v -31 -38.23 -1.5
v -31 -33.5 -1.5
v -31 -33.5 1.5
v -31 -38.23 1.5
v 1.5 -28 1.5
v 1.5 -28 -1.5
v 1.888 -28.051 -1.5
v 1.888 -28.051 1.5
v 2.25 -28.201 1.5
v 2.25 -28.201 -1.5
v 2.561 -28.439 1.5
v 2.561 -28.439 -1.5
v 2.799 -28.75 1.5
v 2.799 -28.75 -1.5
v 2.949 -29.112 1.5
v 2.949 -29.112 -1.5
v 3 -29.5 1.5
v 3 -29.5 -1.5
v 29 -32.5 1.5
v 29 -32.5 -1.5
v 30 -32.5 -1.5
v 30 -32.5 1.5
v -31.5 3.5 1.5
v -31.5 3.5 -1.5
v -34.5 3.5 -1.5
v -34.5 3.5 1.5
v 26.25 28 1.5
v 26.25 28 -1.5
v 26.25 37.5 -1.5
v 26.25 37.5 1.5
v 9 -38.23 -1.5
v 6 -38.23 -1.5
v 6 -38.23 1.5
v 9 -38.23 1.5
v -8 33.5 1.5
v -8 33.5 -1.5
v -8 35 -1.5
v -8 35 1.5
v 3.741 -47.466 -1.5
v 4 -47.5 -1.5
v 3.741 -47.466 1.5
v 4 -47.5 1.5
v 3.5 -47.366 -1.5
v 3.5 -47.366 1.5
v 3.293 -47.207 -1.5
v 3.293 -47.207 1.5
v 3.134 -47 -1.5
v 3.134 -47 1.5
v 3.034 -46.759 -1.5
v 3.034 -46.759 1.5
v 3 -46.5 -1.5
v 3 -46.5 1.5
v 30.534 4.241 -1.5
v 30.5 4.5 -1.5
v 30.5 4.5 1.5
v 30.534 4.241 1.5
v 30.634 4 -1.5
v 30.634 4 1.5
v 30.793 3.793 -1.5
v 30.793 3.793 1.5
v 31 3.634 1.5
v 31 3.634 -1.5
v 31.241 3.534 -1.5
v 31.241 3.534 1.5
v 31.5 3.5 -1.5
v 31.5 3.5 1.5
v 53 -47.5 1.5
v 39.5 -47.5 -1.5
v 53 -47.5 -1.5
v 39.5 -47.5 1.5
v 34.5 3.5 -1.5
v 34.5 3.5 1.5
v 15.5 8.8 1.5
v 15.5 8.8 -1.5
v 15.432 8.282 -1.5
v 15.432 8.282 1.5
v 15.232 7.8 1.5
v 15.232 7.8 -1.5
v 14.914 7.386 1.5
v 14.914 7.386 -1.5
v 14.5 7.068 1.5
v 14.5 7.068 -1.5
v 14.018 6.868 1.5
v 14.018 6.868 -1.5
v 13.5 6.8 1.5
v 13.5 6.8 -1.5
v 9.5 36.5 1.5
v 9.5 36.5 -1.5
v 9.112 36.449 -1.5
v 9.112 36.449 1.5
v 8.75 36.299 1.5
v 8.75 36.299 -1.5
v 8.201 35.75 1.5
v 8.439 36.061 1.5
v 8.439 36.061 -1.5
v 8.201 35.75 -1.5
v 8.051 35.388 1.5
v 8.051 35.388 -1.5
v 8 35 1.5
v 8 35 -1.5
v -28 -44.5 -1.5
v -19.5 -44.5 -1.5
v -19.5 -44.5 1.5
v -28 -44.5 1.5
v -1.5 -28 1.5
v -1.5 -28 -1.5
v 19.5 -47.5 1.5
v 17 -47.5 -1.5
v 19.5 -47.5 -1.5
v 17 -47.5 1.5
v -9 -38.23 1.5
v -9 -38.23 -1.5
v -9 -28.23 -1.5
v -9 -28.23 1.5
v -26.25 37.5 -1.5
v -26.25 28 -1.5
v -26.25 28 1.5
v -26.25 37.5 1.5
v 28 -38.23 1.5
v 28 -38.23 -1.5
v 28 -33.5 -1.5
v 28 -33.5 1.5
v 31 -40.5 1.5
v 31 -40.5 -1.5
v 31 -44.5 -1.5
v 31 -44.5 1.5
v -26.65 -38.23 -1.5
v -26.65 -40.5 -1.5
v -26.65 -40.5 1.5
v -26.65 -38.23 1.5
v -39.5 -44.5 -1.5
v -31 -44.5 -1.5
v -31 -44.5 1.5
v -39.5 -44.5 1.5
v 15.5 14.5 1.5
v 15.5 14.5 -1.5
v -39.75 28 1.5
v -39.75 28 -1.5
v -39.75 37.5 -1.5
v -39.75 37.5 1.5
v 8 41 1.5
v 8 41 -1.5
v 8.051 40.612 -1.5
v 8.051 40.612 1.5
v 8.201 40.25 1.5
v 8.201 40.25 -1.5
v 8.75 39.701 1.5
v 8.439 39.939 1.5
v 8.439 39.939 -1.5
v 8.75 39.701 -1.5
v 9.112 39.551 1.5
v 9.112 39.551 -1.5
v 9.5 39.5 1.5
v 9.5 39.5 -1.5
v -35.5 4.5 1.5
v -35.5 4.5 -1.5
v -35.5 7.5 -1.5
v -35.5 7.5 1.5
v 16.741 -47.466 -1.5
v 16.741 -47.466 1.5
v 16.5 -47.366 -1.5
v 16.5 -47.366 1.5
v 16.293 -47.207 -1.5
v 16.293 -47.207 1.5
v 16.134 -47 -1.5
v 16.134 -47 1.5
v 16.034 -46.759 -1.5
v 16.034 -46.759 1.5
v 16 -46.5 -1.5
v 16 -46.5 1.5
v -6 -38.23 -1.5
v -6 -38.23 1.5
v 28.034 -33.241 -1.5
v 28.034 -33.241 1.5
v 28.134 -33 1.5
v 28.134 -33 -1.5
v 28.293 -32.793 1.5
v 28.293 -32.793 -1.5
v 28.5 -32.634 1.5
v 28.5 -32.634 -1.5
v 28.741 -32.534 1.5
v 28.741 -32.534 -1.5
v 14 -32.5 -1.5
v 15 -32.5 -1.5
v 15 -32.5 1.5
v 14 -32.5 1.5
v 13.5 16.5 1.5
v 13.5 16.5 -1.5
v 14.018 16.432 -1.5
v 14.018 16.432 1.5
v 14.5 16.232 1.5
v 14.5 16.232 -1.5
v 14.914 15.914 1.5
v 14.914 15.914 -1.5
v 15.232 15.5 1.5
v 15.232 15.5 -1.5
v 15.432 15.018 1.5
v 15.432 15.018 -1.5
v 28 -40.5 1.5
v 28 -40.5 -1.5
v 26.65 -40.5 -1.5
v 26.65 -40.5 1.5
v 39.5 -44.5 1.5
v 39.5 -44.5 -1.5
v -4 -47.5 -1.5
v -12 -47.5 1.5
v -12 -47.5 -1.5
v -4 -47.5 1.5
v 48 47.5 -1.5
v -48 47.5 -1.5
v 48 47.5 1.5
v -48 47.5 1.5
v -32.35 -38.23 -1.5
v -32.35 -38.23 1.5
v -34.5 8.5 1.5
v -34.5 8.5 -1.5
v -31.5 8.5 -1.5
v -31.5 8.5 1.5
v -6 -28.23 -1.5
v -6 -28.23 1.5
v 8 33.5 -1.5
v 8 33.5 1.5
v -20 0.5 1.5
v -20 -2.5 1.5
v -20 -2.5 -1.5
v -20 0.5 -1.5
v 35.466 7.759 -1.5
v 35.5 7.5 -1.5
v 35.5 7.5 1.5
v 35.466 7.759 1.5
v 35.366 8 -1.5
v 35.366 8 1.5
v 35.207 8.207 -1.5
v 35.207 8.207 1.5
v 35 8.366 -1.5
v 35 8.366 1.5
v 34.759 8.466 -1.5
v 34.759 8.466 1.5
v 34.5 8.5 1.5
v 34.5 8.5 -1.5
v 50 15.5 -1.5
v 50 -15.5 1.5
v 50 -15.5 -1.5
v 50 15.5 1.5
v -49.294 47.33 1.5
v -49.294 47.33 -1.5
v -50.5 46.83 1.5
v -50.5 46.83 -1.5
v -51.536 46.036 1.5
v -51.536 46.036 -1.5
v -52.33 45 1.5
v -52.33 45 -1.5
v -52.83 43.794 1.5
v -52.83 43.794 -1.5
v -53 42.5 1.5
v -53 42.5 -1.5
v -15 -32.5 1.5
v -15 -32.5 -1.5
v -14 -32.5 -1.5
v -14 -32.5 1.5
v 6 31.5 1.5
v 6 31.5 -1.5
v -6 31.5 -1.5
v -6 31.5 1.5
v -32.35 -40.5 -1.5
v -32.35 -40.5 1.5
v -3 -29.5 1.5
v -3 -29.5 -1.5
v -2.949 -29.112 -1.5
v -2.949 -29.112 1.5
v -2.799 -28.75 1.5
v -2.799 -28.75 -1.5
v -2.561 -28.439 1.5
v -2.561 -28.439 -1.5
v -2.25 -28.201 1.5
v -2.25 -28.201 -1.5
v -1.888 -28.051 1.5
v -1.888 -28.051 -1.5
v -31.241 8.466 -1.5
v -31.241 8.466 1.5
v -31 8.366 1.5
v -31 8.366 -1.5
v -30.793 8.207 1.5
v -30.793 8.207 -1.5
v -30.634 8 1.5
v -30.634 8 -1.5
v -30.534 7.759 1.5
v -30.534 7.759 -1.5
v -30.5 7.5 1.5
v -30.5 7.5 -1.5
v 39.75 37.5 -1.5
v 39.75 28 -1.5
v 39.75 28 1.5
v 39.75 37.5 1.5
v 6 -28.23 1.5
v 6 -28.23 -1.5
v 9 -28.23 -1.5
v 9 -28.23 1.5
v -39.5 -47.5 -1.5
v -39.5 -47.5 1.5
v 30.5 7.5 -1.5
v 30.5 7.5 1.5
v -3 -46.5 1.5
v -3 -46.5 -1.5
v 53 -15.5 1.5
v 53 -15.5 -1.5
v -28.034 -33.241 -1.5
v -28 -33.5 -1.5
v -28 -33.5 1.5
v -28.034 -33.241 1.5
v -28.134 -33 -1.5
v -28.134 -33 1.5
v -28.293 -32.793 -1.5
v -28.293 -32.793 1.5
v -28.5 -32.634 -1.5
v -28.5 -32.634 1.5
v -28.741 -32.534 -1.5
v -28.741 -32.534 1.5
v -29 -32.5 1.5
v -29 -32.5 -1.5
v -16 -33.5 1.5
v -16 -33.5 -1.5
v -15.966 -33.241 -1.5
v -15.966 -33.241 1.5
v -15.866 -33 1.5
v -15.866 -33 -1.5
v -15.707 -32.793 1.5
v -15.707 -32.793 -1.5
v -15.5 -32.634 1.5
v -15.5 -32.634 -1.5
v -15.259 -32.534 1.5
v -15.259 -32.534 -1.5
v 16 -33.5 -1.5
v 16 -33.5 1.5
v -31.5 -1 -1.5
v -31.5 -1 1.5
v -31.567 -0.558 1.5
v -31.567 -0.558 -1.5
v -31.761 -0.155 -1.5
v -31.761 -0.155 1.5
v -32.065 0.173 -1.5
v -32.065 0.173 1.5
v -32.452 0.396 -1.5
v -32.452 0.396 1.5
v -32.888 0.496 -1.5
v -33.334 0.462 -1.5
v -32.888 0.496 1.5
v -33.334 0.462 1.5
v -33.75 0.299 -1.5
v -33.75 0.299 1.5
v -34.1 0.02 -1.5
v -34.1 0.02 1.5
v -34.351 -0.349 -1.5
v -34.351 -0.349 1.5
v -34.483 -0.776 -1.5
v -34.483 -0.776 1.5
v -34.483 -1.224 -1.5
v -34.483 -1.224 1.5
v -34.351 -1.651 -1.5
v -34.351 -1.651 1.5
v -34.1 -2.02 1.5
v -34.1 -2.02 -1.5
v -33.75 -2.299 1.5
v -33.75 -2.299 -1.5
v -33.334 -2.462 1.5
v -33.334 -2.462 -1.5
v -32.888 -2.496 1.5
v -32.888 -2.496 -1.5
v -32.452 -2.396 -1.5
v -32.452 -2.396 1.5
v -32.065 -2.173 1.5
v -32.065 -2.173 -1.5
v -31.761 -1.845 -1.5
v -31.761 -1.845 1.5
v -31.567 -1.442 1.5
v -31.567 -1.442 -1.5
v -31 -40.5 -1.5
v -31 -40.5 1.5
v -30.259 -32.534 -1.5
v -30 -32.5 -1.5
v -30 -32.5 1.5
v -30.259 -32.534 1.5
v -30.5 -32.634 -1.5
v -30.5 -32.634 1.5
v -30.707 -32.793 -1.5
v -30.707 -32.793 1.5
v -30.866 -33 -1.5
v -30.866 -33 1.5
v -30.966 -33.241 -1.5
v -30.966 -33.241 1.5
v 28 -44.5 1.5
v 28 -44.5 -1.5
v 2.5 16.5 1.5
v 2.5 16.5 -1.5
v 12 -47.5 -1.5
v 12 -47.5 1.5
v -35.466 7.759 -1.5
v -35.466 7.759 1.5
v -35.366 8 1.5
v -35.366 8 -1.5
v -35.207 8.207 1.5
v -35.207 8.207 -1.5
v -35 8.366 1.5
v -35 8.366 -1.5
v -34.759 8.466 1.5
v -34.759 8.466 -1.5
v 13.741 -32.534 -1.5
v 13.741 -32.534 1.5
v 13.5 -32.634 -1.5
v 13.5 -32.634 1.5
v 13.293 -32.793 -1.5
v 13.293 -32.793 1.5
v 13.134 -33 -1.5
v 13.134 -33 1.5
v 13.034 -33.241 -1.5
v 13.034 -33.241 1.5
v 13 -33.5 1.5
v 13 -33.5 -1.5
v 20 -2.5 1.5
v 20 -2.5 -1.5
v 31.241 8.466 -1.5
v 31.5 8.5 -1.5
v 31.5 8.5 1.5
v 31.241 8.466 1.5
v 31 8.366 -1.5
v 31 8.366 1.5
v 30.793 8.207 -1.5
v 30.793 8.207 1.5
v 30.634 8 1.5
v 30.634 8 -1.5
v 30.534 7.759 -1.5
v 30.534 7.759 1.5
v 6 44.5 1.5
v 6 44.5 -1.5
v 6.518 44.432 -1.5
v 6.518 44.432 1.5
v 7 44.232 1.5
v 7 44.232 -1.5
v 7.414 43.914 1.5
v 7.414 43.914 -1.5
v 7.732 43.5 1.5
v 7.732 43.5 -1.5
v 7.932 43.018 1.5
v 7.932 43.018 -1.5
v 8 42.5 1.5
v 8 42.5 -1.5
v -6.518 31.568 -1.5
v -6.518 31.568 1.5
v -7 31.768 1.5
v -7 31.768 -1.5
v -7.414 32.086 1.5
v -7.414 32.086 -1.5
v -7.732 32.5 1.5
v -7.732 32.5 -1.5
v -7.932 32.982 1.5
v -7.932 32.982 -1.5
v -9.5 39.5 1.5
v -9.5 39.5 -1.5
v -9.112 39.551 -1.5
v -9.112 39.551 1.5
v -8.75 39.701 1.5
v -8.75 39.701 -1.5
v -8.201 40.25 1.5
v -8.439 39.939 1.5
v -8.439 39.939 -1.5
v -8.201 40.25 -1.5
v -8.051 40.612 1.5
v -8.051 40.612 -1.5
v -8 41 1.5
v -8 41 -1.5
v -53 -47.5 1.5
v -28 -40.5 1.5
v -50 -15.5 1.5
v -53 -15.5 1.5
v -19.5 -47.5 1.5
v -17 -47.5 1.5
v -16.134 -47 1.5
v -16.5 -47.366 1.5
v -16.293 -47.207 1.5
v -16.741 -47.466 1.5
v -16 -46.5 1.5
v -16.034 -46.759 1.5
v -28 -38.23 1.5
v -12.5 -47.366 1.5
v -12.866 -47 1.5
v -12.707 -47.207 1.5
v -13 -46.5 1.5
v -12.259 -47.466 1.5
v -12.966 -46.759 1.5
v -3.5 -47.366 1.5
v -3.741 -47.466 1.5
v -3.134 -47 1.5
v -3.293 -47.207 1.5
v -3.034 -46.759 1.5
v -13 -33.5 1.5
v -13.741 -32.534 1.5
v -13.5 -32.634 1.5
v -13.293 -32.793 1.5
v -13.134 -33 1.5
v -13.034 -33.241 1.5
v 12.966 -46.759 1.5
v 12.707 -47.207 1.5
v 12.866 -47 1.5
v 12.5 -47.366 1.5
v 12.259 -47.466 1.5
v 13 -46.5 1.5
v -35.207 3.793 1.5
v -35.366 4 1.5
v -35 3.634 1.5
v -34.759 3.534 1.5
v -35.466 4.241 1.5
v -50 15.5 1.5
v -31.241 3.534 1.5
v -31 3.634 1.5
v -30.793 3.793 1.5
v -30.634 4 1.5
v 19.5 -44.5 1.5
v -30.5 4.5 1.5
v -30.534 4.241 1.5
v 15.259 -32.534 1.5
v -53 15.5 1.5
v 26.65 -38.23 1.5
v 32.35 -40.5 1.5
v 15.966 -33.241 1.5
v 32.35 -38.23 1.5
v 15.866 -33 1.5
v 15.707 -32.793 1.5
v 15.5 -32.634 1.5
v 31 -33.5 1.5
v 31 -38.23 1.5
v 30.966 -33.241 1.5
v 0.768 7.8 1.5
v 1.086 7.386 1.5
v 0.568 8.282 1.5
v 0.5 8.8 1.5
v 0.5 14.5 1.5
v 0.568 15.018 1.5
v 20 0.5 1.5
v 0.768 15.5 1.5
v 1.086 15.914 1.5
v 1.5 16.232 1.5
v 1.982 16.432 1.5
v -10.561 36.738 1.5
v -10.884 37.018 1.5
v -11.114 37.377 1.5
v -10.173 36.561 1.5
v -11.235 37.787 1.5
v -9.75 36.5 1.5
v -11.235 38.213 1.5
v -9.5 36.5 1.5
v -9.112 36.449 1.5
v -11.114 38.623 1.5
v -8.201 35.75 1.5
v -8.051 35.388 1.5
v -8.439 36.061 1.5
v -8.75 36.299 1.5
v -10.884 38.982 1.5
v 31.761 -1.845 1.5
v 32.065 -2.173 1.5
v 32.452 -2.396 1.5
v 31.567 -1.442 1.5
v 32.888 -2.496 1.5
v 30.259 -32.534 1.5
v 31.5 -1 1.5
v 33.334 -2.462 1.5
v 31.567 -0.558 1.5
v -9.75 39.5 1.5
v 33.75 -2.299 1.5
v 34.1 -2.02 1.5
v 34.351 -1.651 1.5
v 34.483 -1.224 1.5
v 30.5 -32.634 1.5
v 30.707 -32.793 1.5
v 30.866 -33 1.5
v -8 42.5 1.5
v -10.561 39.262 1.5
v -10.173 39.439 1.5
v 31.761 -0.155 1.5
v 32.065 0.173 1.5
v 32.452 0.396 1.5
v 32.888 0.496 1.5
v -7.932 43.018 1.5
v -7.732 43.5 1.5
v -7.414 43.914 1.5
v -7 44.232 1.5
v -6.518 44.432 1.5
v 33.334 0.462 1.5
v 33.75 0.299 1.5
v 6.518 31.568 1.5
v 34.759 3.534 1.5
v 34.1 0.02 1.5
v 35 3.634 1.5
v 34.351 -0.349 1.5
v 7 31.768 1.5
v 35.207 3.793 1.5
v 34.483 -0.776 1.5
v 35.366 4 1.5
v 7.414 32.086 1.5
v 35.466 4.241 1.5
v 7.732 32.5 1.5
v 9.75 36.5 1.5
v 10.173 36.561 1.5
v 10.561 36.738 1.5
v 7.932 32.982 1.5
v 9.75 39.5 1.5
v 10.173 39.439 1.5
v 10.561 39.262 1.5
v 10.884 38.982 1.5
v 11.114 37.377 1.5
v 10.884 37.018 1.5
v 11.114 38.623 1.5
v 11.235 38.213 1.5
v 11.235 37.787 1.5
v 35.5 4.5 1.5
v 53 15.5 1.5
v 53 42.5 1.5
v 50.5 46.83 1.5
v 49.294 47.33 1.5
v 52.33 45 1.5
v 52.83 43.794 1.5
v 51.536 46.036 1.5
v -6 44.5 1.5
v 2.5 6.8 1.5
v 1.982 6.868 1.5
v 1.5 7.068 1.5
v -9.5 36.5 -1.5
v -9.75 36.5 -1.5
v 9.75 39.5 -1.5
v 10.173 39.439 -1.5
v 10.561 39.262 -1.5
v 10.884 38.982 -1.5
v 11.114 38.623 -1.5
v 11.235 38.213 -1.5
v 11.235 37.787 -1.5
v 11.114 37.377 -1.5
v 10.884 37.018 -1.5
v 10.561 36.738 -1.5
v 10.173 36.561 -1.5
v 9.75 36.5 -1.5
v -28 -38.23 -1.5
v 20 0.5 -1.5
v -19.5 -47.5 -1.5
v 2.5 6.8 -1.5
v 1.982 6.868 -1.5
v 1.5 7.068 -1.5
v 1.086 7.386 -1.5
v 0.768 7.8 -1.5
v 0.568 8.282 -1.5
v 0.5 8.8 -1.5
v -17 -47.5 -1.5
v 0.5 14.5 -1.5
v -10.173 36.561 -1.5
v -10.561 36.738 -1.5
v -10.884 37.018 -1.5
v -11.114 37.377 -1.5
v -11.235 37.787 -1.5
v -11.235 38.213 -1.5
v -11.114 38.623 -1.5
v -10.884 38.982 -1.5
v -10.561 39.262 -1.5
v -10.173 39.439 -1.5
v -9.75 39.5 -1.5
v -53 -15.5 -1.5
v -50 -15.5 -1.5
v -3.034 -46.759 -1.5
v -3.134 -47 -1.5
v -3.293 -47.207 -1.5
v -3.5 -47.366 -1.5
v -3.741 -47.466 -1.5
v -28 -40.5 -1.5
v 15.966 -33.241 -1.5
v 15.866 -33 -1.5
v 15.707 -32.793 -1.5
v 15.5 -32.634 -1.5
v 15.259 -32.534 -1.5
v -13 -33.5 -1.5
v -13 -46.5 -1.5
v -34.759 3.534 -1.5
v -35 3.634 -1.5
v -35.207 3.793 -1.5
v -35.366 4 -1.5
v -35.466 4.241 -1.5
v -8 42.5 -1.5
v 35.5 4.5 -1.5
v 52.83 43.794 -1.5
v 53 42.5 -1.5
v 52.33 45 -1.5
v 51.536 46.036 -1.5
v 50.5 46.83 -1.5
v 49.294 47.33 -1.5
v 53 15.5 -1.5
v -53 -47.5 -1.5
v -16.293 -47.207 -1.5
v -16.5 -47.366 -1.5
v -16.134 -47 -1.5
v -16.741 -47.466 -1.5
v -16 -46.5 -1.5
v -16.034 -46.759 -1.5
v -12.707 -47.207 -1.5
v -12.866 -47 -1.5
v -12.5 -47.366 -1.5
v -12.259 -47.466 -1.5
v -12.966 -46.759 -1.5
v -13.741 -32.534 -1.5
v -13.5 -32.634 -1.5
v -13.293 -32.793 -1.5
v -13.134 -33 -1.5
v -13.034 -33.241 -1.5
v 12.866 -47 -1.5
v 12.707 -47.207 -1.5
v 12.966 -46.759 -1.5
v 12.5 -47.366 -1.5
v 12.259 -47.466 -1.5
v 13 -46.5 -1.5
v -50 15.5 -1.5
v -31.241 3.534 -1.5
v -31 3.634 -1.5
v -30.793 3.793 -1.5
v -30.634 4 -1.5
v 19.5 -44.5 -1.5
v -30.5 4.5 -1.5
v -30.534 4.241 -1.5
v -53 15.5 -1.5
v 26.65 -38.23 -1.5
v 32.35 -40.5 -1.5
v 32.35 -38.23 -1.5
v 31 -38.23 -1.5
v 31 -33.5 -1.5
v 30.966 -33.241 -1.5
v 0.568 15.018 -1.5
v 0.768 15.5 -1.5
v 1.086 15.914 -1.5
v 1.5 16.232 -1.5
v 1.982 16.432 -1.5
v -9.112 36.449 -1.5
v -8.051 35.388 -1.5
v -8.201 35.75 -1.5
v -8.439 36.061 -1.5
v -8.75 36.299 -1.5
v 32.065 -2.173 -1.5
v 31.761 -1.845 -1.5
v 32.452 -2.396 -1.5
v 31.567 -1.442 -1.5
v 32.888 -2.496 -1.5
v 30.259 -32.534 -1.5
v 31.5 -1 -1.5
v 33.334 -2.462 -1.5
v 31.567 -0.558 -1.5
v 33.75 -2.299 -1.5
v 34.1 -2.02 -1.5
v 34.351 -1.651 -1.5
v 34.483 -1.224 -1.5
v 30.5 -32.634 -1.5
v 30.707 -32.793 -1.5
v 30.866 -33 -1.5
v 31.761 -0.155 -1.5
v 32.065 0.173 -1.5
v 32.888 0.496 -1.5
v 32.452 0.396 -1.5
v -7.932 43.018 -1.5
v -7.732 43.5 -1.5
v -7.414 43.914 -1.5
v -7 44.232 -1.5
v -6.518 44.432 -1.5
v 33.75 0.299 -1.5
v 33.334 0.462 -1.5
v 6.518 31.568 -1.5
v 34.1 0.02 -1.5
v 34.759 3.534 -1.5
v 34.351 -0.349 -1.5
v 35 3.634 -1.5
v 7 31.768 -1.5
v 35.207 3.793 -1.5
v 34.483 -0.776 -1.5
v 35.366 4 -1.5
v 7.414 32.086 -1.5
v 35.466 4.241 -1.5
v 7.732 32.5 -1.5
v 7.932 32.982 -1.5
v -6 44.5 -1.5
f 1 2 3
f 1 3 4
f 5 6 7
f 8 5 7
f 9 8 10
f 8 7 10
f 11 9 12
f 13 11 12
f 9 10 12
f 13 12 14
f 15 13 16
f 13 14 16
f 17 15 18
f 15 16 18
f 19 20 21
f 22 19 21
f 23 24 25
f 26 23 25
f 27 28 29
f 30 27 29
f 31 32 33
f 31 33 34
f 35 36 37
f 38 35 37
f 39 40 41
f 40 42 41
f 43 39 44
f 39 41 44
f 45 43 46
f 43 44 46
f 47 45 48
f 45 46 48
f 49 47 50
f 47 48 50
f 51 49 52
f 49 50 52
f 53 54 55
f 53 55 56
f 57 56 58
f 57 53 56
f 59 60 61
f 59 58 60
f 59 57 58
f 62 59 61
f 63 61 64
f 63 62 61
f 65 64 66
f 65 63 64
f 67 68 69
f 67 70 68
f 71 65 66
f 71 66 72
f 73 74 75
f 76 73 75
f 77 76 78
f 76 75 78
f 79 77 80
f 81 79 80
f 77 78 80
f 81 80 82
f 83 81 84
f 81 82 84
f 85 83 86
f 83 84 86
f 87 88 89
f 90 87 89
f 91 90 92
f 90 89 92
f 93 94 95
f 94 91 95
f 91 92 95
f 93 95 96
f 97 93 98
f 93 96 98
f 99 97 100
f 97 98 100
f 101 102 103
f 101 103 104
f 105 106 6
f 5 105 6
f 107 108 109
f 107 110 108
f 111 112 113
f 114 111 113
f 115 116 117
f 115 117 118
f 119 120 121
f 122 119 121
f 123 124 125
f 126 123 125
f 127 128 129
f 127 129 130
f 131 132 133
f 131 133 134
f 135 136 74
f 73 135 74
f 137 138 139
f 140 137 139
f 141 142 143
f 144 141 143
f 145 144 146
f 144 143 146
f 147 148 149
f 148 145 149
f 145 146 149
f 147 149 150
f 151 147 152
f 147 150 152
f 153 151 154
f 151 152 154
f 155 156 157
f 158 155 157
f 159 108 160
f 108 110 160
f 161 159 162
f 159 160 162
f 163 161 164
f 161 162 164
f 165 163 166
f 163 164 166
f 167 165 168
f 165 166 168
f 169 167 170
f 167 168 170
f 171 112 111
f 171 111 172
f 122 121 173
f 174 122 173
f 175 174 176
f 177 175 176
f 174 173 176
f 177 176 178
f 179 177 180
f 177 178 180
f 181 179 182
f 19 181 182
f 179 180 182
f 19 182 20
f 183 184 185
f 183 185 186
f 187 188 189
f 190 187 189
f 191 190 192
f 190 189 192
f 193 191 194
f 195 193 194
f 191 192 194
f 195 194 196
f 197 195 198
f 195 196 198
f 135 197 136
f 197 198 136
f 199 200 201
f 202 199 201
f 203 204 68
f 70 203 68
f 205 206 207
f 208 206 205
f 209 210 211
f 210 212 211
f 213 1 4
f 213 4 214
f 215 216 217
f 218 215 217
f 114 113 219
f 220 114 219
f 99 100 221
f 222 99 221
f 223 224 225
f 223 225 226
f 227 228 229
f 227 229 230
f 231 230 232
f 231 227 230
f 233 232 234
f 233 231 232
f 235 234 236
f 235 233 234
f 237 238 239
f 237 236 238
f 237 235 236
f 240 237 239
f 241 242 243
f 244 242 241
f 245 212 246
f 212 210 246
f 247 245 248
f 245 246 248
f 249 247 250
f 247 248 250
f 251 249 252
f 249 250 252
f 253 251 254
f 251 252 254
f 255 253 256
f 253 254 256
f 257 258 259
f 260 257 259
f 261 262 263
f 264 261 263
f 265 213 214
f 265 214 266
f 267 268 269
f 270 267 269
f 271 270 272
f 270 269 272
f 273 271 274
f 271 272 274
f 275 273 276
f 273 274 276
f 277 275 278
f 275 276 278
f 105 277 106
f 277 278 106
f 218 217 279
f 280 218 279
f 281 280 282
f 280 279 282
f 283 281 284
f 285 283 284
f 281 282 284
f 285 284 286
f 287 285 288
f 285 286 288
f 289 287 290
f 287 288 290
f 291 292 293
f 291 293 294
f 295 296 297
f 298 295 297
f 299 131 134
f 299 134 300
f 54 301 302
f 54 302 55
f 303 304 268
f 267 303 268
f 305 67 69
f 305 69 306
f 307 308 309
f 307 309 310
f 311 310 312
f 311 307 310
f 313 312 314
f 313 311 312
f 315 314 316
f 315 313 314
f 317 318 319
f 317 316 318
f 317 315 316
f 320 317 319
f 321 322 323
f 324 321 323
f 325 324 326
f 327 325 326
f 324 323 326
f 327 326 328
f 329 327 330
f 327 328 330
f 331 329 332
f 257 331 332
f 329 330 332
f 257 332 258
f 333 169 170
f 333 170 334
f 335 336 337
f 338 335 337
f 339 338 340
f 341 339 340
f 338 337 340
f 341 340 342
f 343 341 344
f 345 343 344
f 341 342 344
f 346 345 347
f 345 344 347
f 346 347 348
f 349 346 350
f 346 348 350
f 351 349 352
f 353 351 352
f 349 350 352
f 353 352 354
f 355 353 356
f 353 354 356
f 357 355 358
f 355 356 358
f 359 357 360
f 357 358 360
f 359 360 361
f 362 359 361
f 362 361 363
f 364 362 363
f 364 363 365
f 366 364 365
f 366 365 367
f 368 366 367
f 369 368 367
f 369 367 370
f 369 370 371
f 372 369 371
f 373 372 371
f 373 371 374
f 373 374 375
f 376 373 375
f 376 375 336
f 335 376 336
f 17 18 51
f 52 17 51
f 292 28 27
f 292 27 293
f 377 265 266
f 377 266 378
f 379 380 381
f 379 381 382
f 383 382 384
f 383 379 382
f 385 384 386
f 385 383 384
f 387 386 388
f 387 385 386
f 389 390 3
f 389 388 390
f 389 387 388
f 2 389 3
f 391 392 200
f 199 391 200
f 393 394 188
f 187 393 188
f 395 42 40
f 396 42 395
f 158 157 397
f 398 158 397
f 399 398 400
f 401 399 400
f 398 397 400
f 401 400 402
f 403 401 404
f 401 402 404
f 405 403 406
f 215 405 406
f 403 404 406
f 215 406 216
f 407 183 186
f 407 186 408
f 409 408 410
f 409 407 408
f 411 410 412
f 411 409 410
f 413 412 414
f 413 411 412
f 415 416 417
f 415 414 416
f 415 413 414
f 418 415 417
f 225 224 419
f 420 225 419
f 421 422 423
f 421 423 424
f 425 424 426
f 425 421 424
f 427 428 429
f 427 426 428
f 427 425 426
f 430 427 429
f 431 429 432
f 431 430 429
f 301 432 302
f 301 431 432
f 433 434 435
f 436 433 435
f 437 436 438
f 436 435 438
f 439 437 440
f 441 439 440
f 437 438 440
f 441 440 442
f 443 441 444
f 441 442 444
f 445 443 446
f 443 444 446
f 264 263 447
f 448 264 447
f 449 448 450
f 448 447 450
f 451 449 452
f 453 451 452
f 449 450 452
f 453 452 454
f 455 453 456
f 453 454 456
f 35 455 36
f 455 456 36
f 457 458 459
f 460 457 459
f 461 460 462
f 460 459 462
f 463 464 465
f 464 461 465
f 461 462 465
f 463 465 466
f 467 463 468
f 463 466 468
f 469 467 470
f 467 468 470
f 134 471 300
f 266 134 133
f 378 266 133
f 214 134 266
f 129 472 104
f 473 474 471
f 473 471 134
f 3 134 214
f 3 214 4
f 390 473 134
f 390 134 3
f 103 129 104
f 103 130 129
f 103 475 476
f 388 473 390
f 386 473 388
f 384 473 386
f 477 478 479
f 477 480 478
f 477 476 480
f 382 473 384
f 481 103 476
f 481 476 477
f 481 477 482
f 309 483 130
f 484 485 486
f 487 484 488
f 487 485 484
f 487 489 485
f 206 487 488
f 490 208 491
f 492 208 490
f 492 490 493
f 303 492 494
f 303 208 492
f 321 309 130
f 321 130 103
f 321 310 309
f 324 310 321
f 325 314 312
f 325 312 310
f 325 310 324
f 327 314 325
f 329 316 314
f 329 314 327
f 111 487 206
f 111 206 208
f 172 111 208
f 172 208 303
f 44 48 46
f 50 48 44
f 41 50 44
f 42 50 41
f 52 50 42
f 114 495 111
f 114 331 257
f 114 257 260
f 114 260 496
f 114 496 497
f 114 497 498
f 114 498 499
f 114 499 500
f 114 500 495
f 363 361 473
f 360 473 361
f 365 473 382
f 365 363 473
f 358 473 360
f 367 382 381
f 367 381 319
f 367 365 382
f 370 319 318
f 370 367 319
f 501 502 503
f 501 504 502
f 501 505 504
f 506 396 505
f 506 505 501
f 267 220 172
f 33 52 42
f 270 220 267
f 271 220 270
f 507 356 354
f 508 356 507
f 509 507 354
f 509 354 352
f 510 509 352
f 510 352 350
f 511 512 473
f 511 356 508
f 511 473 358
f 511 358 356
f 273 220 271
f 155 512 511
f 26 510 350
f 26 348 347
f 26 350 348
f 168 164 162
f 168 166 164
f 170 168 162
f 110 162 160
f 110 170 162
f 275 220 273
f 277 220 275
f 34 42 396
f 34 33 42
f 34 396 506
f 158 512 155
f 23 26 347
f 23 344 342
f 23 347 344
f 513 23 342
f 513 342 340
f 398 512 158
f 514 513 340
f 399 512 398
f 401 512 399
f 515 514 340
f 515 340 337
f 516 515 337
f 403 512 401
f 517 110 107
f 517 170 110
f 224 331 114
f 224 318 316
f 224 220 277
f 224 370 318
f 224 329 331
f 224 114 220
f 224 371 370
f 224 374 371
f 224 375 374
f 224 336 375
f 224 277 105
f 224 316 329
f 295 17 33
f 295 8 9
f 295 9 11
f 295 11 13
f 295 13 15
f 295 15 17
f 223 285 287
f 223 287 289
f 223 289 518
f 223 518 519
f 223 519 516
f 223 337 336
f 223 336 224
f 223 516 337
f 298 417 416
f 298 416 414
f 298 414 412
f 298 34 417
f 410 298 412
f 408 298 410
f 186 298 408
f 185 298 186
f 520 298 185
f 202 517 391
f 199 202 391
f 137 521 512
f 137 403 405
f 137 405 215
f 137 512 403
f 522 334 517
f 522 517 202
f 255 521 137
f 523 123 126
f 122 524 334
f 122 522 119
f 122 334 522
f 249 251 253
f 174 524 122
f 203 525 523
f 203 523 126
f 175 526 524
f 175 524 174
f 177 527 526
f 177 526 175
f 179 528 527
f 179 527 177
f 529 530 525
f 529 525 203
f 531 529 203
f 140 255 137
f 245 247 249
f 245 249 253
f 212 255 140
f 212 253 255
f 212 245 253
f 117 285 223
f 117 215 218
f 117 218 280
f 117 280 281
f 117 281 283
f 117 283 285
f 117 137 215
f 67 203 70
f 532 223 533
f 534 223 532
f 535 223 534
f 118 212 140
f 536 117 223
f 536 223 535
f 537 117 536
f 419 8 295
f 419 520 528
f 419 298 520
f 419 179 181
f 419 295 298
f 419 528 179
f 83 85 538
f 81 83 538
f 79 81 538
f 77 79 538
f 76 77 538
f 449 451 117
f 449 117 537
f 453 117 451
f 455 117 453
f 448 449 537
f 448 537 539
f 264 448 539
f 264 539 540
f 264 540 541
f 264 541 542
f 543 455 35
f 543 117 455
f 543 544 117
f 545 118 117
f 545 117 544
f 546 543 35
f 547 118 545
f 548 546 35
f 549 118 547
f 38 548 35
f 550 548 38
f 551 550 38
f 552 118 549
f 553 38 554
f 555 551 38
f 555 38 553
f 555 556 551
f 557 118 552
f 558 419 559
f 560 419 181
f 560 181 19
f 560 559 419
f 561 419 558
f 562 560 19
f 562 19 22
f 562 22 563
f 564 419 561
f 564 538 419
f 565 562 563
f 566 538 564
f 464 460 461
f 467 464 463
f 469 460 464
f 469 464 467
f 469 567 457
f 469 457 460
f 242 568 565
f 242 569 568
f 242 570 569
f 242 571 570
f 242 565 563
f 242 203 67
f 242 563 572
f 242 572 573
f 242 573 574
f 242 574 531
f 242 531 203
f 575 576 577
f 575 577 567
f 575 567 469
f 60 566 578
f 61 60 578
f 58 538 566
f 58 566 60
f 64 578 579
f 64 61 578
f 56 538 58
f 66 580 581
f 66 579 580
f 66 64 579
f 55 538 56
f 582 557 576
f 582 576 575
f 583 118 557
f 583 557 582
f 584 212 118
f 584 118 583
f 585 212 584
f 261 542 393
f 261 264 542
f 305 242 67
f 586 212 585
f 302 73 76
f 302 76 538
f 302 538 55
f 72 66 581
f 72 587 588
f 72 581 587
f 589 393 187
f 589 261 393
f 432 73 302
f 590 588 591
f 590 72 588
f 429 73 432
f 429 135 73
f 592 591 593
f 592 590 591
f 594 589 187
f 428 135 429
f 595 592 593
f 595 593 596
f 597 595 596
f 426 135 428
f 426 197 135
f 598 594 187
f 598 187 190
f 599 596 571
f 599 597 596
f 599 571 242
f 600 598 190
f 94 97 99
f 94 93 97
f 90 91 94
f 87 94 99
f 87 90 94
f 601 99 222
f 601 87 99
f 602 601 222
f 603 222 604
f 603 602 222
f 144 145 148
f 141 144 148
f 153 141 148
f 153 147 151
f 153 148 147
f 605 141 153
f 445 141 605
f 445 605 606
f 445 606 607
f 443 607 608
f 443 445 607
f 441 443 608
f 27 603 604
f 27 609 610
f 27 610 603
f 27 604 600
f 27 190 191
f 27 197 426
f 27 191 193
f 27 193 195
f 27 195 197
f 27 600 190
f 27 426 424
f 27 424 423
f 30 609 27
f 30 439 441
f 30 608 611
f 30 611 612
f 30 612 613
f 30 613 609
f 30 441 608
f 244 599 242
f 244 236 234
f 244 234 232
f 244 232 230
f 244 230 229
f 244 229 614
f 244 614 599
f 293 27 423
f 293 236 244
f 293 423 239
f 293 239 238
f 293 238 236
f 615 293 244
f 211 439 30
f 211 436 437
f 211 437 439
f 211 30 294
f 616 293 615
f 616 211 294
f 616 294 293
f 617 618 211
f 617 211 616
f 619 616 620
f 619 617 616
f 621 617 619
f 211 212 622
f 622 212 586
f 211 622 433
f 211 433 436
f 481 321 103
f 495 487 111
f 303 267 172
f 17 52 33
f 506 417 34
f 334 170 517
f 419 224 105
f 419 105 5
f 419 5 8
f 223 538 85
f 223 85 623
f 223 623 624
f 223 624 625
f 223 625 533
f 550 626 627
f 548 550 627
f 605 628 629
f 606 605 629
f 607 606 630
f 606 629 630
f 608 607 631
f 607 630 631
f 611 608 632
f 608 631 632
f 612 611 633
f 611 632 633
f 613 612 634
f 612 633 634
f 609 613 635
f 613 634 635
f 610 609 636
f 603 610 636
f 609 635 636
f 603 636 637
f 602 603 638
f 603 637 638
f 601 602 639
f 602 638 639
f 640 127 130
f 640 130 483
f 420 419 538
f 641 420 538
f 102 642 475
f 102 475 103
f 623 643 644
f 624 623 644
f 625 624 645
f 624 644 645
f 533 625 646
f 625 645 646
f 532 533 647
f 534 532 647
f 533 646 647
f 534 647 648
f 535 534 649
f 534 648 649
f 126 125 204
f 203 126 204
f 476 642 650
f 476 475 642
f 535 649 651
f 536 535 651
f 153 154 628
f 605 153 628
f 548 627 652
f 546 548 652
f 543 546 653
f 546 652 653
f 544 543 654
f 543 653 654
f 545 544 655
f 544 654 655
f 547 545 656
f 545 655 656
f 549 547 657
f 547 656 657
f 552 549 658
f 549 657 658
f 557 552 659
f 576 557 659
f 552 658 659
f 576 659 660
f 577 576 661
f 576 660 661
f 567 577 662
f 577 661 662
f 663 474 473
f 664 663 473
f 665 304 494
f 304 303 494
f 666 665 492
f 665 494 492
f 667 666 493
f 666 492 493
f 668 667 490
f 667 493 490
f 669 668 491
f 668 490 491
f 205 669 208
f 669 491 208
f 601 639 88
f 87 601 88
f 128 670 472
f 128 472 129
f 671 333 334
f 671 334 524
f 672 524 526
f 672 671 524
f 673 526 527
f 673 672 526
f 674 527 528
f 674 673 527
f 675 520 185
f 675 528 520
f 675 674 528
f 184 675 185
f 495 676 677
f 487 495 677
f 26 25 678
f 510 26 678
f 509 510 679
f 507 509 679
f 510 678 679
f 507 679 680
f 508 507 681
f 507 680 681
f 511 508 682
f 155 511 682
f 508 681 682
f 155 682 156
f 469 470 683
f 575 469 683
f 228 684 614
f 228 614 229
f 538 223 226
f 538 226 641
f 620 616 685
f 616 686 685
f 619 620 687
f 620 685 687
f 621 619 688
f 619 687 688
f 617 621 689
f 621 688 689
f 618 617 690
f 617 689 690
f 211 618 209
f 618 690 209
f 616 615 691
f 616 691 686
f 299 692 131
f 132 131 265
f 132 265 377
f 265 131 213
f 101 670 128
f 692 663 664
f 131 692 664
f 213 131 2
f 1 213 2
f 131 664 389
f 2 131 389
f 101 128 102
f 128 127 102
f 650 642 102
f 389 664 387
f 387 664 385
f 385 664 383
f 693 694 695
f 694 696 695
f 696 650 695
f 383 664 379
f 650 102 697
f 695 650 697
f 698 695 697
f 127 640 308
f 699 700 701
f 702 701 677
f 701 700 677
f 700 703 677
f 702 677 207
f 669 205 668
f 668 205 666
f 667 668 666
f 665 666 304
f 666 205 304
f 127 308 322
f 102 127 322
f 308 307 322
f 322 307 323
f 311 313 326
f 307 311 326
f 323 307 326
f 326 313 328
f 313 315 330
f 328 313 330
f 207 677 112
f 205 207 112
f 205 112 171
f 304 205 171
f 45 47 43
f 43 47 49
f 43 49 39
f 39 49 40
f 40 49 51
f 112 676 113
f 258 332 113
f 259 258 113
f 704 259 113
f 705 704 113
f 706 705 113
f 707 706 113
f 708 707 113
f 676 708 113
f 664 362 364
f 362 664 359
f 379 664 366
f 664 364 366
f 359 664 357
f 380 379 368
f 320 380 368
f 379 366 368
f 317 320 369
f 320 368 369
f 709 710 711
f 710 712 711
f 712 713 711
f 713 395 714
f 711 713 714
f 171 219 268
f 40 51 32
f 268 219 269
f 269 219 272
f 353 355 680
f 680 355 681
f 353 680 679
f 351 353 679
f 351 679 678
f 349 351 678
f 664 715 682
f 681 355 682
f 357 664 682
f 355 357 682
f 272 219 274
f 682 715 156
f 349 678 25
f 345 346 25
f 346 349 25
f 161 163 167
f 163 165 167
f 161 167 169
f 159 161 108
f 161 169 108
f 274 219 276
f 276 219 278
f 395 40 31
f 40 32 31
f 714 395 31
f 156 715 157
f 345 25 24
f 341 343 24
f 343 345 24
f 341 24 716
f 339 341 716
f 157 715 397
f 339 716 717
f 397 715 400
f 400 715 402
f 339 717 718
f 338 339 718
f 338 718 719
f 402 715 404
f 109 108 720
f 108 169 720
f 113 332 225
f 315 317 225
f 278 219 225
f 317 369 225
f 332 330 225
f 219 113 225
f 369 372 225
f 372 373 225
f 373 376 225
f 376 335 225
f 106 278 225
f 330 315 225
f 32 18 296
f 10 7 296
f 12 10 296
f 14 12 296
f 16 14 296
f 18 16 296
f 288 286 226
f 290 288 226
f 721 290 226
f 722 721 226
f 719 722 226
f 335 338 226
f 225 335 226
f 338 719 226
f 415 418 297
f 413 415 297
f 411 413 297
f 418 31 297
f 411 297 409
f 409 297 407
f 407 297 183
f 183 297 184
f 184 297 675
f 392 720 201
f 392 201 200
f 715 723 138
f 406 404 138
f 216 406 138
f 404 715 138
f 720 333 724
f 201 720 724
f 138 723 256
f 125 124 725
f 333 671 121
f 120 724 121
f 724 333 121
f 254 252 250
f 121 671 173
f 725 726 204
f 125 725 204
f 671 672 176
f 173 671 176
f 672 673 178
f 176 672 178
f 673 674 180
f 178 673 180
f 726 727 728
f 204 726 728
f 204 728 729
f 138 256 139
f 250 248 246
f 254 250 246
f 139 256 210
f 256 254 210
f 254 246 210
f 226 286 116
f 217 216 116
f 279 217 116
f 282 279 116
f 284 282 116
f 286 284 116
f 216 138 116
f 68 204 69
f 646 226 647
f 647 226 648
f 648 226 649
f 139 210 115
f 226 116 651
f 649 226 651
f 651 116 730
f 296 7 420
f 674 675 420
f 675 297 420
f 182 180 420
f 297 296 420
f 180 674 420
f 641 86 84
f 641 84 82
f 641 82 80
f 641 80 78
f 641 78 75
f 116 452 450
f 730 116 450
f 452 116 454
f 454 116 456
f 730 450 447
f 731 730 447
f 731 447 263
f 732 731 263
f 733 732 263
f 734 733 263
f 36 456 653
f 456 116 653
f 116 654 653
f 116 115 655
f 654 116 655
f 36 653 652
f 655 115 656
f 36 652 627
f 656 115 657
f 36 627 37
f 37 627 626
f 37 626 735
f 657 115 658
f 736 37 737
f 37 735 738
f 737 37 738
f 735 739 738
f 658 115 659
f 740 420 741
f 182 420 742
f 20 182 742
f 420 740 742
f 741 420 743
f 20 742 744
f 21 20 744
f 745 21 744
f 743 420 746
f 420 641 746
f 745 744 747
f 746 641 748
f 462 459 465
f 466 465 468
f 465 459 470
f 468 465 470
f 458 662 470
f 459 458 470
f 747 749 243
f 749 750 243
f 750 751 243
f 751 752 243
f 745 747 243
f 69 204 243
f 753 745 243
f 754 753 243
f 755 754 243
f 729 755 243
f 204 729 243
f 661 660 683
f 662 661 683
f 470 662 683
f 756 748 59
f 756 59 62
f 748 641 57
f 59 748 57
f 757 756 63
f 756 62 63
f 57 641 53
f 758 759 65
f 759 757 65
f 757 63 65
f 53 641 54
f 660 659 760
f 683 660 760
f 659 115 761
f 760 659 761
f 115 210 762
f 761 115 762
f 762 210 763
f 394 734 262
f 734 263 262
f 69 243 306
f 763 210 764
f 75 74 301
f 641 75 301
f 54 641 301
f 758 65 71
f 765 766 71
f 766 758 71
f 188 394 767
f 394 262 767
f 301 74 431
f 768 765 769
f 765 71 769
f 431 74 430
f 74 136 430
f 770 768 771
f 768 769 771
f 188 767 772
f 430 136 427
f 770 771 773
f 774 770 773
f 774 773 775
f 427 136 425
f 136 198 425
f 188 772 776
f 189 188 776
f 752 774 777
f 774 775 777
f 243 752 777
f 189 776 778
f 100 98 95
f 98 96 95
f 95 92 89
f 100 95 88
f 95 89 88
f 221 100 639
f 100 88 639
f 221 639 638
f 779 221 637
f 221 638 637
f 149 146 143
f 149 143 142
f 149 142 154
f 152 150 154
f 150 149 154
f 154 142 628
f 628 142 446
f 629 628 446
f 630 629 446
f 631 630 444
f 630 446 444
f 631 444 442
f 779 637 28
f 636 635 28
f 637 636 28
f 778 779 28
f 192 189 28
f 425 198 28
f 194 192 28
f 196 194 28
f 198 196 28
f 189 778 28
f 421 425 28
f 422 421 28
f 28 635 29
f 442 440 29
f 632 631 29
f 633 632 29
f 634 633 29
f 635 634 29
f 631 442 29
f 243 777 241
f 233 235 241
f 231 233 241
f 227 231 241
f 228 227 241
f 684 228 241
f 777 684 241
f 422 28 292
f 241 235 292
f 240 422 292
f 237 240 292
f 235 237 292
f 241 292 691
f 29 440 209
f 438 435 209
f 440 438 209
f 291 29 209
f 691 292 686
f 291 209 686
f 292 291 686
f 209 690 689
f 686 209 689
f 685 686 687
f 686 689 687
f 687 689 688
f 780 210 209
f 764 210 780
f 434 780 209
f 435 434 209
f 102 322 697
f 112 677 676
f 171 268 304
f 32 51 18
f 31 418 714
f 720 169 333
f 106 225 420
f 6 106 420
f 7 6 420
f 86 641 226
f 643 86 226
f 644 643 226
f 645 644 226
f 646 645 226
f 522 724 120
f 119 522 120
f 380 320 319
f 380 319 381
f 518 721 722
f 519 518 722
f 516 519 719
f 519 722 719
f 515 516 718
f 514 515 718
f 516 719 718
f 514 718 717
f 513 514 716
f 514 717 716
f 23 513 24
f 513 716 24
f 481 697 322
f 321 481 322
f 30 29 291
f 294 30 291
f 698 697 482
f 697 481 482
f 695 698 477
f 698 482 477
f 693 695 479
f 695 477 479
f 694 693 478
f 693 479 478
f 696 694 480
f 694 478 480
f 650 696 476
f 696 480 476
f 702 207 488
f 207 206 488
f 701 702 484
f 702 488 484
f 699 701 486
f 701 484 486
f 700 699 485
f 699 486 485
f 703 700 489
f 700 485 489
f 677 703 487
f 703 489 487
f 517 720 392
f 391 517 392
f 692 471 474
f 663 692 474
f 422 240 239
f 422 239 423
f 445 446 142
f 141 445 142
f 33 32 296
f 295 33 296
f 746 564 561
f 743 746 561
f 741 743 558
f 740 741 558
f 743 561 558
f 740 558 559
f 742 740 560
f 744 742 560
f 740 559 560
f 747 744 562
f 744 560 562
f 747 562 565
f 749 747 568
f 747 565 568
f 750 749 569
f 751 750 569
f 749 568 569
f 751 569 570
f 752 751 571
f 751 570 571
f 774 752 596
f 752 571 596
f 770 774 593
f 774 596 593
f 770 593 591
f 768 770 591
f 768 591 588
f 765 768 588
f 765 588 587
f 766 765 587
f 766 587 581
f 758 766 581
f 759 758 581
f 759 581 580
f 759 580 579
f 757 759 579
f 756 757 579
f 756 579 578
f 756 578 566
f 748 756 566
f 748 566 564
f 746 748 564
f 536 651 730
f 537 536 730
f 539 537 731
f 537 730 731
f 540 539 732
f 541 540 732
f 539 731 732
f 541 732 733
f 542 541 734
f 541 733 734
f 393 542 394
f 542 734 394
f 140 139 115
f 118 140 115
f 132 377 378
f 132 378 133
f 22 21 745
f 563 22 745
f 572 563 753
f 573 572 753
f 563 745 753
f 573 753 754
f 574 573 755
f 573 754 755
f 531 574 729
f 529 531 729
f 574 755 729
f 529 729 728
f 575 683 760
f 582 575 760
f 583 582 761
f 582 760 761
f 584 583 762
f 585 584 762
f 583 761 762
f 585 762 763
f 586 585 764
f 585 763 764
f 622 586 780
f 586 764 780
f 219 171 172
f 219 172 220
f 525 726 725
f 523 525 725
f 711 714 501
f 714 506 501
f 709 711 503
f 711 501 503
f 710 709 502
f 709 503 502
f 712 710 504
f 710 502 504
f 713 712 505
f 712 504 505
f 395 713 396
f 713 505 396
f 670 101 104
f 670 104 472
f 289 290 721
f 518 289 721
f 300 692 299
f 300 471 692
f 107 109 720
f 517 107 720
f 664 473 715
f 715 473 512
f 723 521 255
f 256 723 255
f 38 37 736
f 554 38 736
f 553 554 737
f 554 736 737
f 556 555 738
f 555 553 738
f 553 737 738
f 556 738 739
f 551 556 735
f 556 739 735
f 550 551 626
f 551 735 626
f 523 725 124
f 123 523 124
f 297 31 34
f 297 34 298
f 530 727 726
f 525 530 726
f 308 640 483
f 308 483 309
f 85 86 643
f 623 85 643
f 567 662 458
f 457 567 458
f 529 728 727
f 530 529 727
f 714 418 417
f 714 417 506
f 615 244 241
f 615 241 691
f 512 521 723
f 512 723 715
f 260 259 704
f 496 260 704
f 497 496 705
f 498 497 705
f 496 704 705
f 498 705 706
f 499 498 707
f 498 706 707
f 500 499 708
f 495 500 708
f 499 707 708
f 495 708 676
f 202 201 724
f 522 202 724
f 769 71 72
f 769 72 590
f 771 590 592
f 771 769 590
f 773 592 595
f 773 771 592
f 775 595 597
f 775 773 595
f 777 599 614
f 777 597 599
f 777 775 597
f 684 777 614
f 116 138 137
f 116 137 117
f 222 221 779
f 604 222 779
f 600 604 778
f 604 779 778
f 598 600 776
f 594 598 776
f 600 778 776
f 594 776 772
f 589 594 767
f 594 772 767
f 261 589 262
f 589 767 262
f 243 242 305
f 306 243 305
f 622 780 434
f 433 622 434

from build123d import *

# Parameters (mm, degrees)
ESBO_O1_W                = 100
ESBO_O1_H                = 95
RESSALTO_EXTRUS_O1_DEPTH = 1.5
ESBO_O3_W                = 3
ESBO_O3_H                = 32
RESSALTO_EXTRUS_O2_DEPTH = 3
ESBO_O2_R                = 1.5
ESBO_O2_W                = 40
ESBO_O2_H                = 3
CORTE_EXTRUS_O1_DEPTH    = 72.233770081
CUT_EXTRUDE3_DEPTH       = 72.233770081
CUT_EXTRUDE3_DEPTH_BACK  = 72.233770081
CUT_EXTRUDE5_DEPTH       = 72.186375101
CUT_EXTRUDE5_DEPTH_BACK  = 72.186375101
CUT_EXTRUDE6_DEPTH       = 72.186375101
CUT_EXTRUDE6_DEPTH_BACK  = 72.186375101
SKETCH7_W                = 13.5
SKETCH7_H                = 9.5
CUT_EXTRUDE7_DEPTH       = 72.186375101
CUT_EXTRUDE7_DEPTH_BACK  = 72.186375101
SKETCH8_W                = 3
SKETCH8_H                = 10
CUT_EXTRUDE8_DEPTH       = 72.186375101
CUT_EXTRUDE8_DEPTH_BACK  = 72.186375101
CUT_EXTRUDE10_DEPTH      = 72.186375101
CUT_EXTRUDE10_DEPTH_BACK = 72.186375101
CUT_EXTRUDE11_DEPTH      = 72.186375101
CUT_EXTRUDE11_DEPTH_BACK = 72.186375101
FILLET1_R                = 1
FILLET2_R                = 5


with BuildPart() as part:
    # Esboço1 → Ressalto-extrusão1 (new, symmetric)
    with BuildSketch(Plane.XY):
        Rectangle(ESBO_O1_W, ESBO_O1_H)
    extrude(amount=RESSALTO_EXTRUS_O1_DEPTH, both=True)

    # Esboço3 → Ressalto-extrusão2 (add, through all)
    with BuildSketch(Plane.XY.offset(1.5)):
        with Locations((-51.5, 31.5)):
            Rectangle(ESBO_O3_W, ESBO_O3_H)
        with Locations((-51.5, -31.5)):
            Rectangle(ESBO_O3_W, ESBO_O3_H)
        with Locations((51.5, -31.5)):
            Rectangle(ESBO_O3_W, ESBO_O3_H)
        with Locations((51.5, 31.5)):
            Rectangle(ESBO_O3_W, ESBO_O3_H)
    extrude(amount=-RESSALTO_EXTRUS_O2_DEPTH)

    # Esboço2 → Corte-extrusão1 (cut, through all)
    with BuildSketch(Plane.XY.offset(1.5)):
        with Locations((-33, -1)):
            Circle(ESBO_O2_R)
        with Locations(Location((33, -1, 0), (0, 0, 180))):
            Circle(ESBO_O2_R)
        with Locations((0, -1)):
            Rectangle(ESBO_O2_W, ESBO_O2_H)
    extrude(amount=-CORTE_EXTRUS_O1_DEPTH, mode=Mode.SUBTRACT)

    # Sketch4 → Cut-Extrude3 (cut, two sides: drawn at the far end of the back side and taken through both)
    with BuildSketch(Plane.XY.offset(1.5).offset(-CUT_EXTRUDE3_DEPTH_BACK)):
        with BuildLine():
            Line((-34.5, 8.5), (-31.5, 8.5))
            ThreePointArc((-31.5, 8.5), (-30.792893219, 8.207106781), (-30.5, 7.5))
            Line((-30.5, 7.5), (-30.5, 4.5))
            ThreePointArc((-30.5, 4.5), (-30.792893219, 3.792893219), (-31.5, 3.5))
            Line((-31.5, 3.5), (-34.5, 3.5))
            ThreePointArc((-34.5, 3.5), (-35.207106781, 3.792893219), (-35.5, 4.5))
            Line((-35.5, 4.5), (-35.5, 7.5))
            ThreePointArc((-35.5, 7.5), (-35.207106781, 8.207106781), (-34.5, 8.5))
        make_face()
        with BuildLine():
            Line((30.5, 7.5), (30.5, 4.5))
            ThreePointArc((30.5, 4.5), (30.792893219, 3.792893219), (31.5, 3.5))
            Line((31.5, 3.5), (34.5, 3.5))
            ThreePointArc((34.5, 3.5), (35.207106781, 3.792893219), (35.5, 4.5))
            Line((35.5, 4.5), (35.5, 7.5))
            ThreePointArc((35.5, 7.5), (35.207106781, 8.207106781), (34.5, 8.5))
            Line((34.5, 8.5), (31.5, 8.5))
            ThreePointArc((31.5, 8.5), (30.792893219, 8.207106781), (30.5, 7.5))
        make_face()
    extrude(amount=CUT_EXTRUDE3_DEPTH + CUT_EXTRUDE3_DEPTH_BACK, mode=Mode.SUBTRACT)

    # Sketch6 → Cut-Extrude5 (cut, two sides: drawn at the far end of the back side and taken through both)
    with BuildSketch(Plane.XY.offset(-CUT_EXTRUDE5_DEPTH_BACK)):
        with BuildLine():
            Line((-6, 44.5), (6, 44.5))
            ThreePointArc((6, 44.5), (7.414213562, 43.914213562), (8, 42.5))
            Line((8, 42.5), (8, 41))
            ThreePointArc((8, 41), (8.439339828, 39.939339828), (9.5, 39.5))
            Line((9.5, 39.5), (9.75, 39.5))
            ThreePointArc((9.75, 39.5), (11.25, 38), (9.75, 36.5))
            Line((9.75, 36.5), (9.5, 36.5))
            ThreePointArc((9.5, 36.5), (8.439339828, 36.060660172), (8, 35))
            Line((8, 35), (8, 33.5))
            ThreePointArc((8, 33.5), (7.414213562, 32.085786438), (6, 31.5))
            Line((6, 31.5), (-6, 31.5))
            ThreePointArc((-6, 31.5), (-7.414213562, 32.085786438), (-8, 33.5))
            Line((-8, 33.5), (-8, 35))
            ThreePointArc((-8, 35), (-8.439339828, 36.060660172), (-9.5, 36.5))
            Line((-9.5, 36.5), (-9.75, 36.5))
            ThreePointArc((-9.75, 36.5), (-11.25, 38), (-9.75, 39.5))
            Line((-9.75, 39.5), (-9.5, 39.5))
            ThreePointArc((-9.5, 39.5), (-8.439339828, 39.939339828), (-8, 41))
            Line((-8, 41), (-8, 42.5))
            ThreePointArc((-8, 42.5), (-7.414213562, 43.914213562), (-6, 44.5))
        make_face()
    extrude(amount=CUT_EXTRUDE5_DEPTH + CUT_EXTRUDE5_DEPTH_BACK, mode=Mode.SUBTRACT)

    # Sketch7 → Cut-Extrude6 (cut, two sides: drawn at the far end of the back side and taken through both)
    with BuildSketch(Plane.XY.offset(-CUT_EXTRUDE6_DEPTH_BACK)):
        with Locations((-33, 32.75)):
            Rectangle(SKETCH7_W, SKETCH7_H)
        with Locations((33, 32.75)):
            Rectangle(SKETCH7_W, SKETCH7_H)
    extrude(amount=CUT_EXTRUDE6_DEPTH + CUT_EXTRUDE6_DEPTH_BACK, mode=Mode.SUBTRACT)

    # Sketch8 → Cut-Extrude7 (cut, two sides: drawn at the far end of the back side and taken through both)
    with BuildSketch(Plane.XY.offset(-CUT_EXTRUDE7_DEPTH_BACK)):
        with Locations((-7.5, -33.23)):
            Rectangle(SKETCH8_W, SKETCH8_H)
        with Locations((7.5, -33.23)):
            Rectangle(SKETCH8_W, SKETCH8_H)
    extrude(amount=CUT_EXTRUDE7_DEPTH + CUT_EXTRUDE7_DEPTH_BACK, mode=Mode.SUBTRACT)

    # Sketch9 → Cut-Extrude8 (cut, two sides: drawn at the far end of the back side and taken through both)
    with BuildSketch(Plane.XY.offset(-CUT_EXTRUDE8_DEPTH_BACK)):
        with BuildLine():
            Line((2.5, 16.5), (13.5, 16.5))
            ThreePointArc((13.5, 16.5), (14.914213562, 15.914213562), (15.5, 14.5))
            Line((15.5, 14.5), (15.5, 8.8))
            ThreePointArc((15.5, 8.8), (14.914213562, 7.385786438), (13.5, 6.8))
            Line((13.5, 6.8), (2.5, 6.8))
            ThreePointArc((2.5, 6.8), (1.085786438, 7.385786438), (0.5, 8.8))
            Line((0.5, 8.8), (0.5, 14.5))
            ThreePointArc((0.5, 14.5), (1.085786438, 15.914213562), (2.5, 16.5))
        make_face()
    extrude(amount=CUT_EXTRUDE8_DEPTH + CUT_EXTRUDE8_DEPTH_BACK, mode=Mode.SUBTRACT)

    # Sketch11 → Cut-Extrude10 (cut, two sides: drawn at the far end of the back side and taken through both)
    with BuildSketch(Plane.XY.offset(-CUT_EXTRUDE10_DEPTH_BACK)):
        with BuildLine():
            Line((13, -33.5), (13, -47.5))
            Line((13, -47.5), (16, -47.5))
            Line((16, -47.5), (16, -33.5))
            ThreePointArc((16, -33.5), (15.707106781, -32.792893219), (15, -32.5))
            Line((15, -32.5), (14, -32.5))
            ThreePointArc((14, -32.5), (13.292893219, -32.792893219), (13, -33.5))
        make_face()
        with BuildLine():
            Line((-1.5, -28), (1.5, -28))
            ThreePointArc((1.5, -28), (2.560660172, -28.439339828), (3, -29.5))
            Line((3, -29.5), (3, -47.5))
            Line((3, -47.5), (-3, -47.5))
            Line((-3, -47.5), (-3, -29.5))
            ThreePointArc((-3, -29.5), (-2.560660172, -28.439339828), (-1.5, -28))
        make_face()
        with BuildLine():
            Line((-15, -32.5), (-14, -32.5))
            ThreePointArc((-14, -32.5), (-13.292893219, -32.792893219), (-13, -33.5))
            Line((-13, -33.5), (-13, -47.5))
            Line((-13, -47.5), (-16, -47.5))
            Line((-16, -47.5), (-16, -33.5))
            ThreePointArc((-16, -33.5), (-15.707106781, -32.792893219), (-15, -32.5))
        make_face()
    extrude(amount=CUT_EXTRUDE10_DEPTH + CUT_EXTRUDE10_DEPTH_BACK, mode=Mode.SUBTRACT)

    # Sketch12 → Cut-Extrude11 (cut, two sides: drawn at the far end of the back side and taken through both)
    with BuildSketch(Plane.XY.offset(-CUT_EXTRUDE11_DEPTH_BACK)):
        with BuildLine():
            Line((-39.5, -47.5), (-19.5, -47.5))
            Line((-19.5, -47.5), (-19.5, -44.5))
            Line((-19.5, -44.5), (-28, -44.5))
            Line((-28, -44.5), (-28, -40.5))
            Line((-28, -40.5), (-26.65, -40.5))
            Line((-26.65, -40.5), (-26.65, -38.23))
            Line((-26.65, -38.23), (-28, -38.23))
            Line((-28, -38.23), (-28, -33.5))
            ThreePointArc((-28, -33.5), (-28.292893219, -32.792893219), (-29, -32.5))
            Line((-29, -32.5), (-30, -32.5))
            ThreePointArc((-30, -32.5), (-30.707106781, -32.792893219), (-31, -33.5))
            Line((-31, -33.5), (-31, -38.23))
            Line((-31, -38.23), (-32.35, -38.23))
            Line((-32.35, -38.23), (-32.35, -40.5))
            Line((-32.35, -40.5), (-31, -40.5))
            Line((-31, -40.5), (-31, -44.5))
            Line((-31, -44.5), (-39.5, -44.5))
            Line((-39.5, -44.5), (-39.5, -47.5))
        make_face()
        with BuildLine():
            Line((28, -38.23), (28, -33.5))
            ThreePointArc((28, -33.5), (28.292893219, -32.792893219), (29, -32.5))
            Line((29, -32.5), (30, -32.5))
            ThreePointArc((30, -32.5), (30.707106781, -32.792893219), (31, -33.5))
            Line((31, -33.5), (31, -38.23))
            Line((31, -38.23), (32.35, -38.23))
            Line((32.35, -38.23), (32.35, -40.5))
            Line((32.35, -40.5), (31, -40.5))
            Line((31, -40.5), (31, -44.5))
            Line((31, -44.5), (39.5, -44.5))
            Line((39.5, -44.5), (39.5, -47.5))
            Line((39.5, -47.5), (19.5, -47.5))
            Line((19.5, -47.5), (19.5, -44.5))
            Line((19.5, -44.5), (28, -44.5))
            Line((28, -44.5), (28, -40.5))
            Line((28, -40.5), (26.65, -40.5))
            Line((26.65, -40.5), (26.65, -38.23))
            Line((26.65, -38.23), (28, -38.23))
        make_face()
    extrude(amount=CUT_EXTRUDE11_DEPTH + CUT_EXTRUDE11_DEPTH_BACK, mode=Mode.SUBTRACT)

    # Fillet1
    fillet1_edges = [part.edges().sort_by_distance(p)[0] for p in [
        (16, -47.5, 0),
        (13, -47.5, 0),
        (-13, -47.5, 0),
        (-16, -47.5, 0),
        (3, -47.5, 0),
        (-3, -47.5, 0),
    ]]
    fillet(fillet1_edges, radius=FILLET1_R)

    # Fillet2
    fillet2_edges = [part.edges().sort_by_distance(p)[0] for p in [
        (-53, 47.5, 0),
        (53, 47.5, 0),
    ]]
    fillet(fillet2_edges, radius=FILLET2_R)


solid = part.part
